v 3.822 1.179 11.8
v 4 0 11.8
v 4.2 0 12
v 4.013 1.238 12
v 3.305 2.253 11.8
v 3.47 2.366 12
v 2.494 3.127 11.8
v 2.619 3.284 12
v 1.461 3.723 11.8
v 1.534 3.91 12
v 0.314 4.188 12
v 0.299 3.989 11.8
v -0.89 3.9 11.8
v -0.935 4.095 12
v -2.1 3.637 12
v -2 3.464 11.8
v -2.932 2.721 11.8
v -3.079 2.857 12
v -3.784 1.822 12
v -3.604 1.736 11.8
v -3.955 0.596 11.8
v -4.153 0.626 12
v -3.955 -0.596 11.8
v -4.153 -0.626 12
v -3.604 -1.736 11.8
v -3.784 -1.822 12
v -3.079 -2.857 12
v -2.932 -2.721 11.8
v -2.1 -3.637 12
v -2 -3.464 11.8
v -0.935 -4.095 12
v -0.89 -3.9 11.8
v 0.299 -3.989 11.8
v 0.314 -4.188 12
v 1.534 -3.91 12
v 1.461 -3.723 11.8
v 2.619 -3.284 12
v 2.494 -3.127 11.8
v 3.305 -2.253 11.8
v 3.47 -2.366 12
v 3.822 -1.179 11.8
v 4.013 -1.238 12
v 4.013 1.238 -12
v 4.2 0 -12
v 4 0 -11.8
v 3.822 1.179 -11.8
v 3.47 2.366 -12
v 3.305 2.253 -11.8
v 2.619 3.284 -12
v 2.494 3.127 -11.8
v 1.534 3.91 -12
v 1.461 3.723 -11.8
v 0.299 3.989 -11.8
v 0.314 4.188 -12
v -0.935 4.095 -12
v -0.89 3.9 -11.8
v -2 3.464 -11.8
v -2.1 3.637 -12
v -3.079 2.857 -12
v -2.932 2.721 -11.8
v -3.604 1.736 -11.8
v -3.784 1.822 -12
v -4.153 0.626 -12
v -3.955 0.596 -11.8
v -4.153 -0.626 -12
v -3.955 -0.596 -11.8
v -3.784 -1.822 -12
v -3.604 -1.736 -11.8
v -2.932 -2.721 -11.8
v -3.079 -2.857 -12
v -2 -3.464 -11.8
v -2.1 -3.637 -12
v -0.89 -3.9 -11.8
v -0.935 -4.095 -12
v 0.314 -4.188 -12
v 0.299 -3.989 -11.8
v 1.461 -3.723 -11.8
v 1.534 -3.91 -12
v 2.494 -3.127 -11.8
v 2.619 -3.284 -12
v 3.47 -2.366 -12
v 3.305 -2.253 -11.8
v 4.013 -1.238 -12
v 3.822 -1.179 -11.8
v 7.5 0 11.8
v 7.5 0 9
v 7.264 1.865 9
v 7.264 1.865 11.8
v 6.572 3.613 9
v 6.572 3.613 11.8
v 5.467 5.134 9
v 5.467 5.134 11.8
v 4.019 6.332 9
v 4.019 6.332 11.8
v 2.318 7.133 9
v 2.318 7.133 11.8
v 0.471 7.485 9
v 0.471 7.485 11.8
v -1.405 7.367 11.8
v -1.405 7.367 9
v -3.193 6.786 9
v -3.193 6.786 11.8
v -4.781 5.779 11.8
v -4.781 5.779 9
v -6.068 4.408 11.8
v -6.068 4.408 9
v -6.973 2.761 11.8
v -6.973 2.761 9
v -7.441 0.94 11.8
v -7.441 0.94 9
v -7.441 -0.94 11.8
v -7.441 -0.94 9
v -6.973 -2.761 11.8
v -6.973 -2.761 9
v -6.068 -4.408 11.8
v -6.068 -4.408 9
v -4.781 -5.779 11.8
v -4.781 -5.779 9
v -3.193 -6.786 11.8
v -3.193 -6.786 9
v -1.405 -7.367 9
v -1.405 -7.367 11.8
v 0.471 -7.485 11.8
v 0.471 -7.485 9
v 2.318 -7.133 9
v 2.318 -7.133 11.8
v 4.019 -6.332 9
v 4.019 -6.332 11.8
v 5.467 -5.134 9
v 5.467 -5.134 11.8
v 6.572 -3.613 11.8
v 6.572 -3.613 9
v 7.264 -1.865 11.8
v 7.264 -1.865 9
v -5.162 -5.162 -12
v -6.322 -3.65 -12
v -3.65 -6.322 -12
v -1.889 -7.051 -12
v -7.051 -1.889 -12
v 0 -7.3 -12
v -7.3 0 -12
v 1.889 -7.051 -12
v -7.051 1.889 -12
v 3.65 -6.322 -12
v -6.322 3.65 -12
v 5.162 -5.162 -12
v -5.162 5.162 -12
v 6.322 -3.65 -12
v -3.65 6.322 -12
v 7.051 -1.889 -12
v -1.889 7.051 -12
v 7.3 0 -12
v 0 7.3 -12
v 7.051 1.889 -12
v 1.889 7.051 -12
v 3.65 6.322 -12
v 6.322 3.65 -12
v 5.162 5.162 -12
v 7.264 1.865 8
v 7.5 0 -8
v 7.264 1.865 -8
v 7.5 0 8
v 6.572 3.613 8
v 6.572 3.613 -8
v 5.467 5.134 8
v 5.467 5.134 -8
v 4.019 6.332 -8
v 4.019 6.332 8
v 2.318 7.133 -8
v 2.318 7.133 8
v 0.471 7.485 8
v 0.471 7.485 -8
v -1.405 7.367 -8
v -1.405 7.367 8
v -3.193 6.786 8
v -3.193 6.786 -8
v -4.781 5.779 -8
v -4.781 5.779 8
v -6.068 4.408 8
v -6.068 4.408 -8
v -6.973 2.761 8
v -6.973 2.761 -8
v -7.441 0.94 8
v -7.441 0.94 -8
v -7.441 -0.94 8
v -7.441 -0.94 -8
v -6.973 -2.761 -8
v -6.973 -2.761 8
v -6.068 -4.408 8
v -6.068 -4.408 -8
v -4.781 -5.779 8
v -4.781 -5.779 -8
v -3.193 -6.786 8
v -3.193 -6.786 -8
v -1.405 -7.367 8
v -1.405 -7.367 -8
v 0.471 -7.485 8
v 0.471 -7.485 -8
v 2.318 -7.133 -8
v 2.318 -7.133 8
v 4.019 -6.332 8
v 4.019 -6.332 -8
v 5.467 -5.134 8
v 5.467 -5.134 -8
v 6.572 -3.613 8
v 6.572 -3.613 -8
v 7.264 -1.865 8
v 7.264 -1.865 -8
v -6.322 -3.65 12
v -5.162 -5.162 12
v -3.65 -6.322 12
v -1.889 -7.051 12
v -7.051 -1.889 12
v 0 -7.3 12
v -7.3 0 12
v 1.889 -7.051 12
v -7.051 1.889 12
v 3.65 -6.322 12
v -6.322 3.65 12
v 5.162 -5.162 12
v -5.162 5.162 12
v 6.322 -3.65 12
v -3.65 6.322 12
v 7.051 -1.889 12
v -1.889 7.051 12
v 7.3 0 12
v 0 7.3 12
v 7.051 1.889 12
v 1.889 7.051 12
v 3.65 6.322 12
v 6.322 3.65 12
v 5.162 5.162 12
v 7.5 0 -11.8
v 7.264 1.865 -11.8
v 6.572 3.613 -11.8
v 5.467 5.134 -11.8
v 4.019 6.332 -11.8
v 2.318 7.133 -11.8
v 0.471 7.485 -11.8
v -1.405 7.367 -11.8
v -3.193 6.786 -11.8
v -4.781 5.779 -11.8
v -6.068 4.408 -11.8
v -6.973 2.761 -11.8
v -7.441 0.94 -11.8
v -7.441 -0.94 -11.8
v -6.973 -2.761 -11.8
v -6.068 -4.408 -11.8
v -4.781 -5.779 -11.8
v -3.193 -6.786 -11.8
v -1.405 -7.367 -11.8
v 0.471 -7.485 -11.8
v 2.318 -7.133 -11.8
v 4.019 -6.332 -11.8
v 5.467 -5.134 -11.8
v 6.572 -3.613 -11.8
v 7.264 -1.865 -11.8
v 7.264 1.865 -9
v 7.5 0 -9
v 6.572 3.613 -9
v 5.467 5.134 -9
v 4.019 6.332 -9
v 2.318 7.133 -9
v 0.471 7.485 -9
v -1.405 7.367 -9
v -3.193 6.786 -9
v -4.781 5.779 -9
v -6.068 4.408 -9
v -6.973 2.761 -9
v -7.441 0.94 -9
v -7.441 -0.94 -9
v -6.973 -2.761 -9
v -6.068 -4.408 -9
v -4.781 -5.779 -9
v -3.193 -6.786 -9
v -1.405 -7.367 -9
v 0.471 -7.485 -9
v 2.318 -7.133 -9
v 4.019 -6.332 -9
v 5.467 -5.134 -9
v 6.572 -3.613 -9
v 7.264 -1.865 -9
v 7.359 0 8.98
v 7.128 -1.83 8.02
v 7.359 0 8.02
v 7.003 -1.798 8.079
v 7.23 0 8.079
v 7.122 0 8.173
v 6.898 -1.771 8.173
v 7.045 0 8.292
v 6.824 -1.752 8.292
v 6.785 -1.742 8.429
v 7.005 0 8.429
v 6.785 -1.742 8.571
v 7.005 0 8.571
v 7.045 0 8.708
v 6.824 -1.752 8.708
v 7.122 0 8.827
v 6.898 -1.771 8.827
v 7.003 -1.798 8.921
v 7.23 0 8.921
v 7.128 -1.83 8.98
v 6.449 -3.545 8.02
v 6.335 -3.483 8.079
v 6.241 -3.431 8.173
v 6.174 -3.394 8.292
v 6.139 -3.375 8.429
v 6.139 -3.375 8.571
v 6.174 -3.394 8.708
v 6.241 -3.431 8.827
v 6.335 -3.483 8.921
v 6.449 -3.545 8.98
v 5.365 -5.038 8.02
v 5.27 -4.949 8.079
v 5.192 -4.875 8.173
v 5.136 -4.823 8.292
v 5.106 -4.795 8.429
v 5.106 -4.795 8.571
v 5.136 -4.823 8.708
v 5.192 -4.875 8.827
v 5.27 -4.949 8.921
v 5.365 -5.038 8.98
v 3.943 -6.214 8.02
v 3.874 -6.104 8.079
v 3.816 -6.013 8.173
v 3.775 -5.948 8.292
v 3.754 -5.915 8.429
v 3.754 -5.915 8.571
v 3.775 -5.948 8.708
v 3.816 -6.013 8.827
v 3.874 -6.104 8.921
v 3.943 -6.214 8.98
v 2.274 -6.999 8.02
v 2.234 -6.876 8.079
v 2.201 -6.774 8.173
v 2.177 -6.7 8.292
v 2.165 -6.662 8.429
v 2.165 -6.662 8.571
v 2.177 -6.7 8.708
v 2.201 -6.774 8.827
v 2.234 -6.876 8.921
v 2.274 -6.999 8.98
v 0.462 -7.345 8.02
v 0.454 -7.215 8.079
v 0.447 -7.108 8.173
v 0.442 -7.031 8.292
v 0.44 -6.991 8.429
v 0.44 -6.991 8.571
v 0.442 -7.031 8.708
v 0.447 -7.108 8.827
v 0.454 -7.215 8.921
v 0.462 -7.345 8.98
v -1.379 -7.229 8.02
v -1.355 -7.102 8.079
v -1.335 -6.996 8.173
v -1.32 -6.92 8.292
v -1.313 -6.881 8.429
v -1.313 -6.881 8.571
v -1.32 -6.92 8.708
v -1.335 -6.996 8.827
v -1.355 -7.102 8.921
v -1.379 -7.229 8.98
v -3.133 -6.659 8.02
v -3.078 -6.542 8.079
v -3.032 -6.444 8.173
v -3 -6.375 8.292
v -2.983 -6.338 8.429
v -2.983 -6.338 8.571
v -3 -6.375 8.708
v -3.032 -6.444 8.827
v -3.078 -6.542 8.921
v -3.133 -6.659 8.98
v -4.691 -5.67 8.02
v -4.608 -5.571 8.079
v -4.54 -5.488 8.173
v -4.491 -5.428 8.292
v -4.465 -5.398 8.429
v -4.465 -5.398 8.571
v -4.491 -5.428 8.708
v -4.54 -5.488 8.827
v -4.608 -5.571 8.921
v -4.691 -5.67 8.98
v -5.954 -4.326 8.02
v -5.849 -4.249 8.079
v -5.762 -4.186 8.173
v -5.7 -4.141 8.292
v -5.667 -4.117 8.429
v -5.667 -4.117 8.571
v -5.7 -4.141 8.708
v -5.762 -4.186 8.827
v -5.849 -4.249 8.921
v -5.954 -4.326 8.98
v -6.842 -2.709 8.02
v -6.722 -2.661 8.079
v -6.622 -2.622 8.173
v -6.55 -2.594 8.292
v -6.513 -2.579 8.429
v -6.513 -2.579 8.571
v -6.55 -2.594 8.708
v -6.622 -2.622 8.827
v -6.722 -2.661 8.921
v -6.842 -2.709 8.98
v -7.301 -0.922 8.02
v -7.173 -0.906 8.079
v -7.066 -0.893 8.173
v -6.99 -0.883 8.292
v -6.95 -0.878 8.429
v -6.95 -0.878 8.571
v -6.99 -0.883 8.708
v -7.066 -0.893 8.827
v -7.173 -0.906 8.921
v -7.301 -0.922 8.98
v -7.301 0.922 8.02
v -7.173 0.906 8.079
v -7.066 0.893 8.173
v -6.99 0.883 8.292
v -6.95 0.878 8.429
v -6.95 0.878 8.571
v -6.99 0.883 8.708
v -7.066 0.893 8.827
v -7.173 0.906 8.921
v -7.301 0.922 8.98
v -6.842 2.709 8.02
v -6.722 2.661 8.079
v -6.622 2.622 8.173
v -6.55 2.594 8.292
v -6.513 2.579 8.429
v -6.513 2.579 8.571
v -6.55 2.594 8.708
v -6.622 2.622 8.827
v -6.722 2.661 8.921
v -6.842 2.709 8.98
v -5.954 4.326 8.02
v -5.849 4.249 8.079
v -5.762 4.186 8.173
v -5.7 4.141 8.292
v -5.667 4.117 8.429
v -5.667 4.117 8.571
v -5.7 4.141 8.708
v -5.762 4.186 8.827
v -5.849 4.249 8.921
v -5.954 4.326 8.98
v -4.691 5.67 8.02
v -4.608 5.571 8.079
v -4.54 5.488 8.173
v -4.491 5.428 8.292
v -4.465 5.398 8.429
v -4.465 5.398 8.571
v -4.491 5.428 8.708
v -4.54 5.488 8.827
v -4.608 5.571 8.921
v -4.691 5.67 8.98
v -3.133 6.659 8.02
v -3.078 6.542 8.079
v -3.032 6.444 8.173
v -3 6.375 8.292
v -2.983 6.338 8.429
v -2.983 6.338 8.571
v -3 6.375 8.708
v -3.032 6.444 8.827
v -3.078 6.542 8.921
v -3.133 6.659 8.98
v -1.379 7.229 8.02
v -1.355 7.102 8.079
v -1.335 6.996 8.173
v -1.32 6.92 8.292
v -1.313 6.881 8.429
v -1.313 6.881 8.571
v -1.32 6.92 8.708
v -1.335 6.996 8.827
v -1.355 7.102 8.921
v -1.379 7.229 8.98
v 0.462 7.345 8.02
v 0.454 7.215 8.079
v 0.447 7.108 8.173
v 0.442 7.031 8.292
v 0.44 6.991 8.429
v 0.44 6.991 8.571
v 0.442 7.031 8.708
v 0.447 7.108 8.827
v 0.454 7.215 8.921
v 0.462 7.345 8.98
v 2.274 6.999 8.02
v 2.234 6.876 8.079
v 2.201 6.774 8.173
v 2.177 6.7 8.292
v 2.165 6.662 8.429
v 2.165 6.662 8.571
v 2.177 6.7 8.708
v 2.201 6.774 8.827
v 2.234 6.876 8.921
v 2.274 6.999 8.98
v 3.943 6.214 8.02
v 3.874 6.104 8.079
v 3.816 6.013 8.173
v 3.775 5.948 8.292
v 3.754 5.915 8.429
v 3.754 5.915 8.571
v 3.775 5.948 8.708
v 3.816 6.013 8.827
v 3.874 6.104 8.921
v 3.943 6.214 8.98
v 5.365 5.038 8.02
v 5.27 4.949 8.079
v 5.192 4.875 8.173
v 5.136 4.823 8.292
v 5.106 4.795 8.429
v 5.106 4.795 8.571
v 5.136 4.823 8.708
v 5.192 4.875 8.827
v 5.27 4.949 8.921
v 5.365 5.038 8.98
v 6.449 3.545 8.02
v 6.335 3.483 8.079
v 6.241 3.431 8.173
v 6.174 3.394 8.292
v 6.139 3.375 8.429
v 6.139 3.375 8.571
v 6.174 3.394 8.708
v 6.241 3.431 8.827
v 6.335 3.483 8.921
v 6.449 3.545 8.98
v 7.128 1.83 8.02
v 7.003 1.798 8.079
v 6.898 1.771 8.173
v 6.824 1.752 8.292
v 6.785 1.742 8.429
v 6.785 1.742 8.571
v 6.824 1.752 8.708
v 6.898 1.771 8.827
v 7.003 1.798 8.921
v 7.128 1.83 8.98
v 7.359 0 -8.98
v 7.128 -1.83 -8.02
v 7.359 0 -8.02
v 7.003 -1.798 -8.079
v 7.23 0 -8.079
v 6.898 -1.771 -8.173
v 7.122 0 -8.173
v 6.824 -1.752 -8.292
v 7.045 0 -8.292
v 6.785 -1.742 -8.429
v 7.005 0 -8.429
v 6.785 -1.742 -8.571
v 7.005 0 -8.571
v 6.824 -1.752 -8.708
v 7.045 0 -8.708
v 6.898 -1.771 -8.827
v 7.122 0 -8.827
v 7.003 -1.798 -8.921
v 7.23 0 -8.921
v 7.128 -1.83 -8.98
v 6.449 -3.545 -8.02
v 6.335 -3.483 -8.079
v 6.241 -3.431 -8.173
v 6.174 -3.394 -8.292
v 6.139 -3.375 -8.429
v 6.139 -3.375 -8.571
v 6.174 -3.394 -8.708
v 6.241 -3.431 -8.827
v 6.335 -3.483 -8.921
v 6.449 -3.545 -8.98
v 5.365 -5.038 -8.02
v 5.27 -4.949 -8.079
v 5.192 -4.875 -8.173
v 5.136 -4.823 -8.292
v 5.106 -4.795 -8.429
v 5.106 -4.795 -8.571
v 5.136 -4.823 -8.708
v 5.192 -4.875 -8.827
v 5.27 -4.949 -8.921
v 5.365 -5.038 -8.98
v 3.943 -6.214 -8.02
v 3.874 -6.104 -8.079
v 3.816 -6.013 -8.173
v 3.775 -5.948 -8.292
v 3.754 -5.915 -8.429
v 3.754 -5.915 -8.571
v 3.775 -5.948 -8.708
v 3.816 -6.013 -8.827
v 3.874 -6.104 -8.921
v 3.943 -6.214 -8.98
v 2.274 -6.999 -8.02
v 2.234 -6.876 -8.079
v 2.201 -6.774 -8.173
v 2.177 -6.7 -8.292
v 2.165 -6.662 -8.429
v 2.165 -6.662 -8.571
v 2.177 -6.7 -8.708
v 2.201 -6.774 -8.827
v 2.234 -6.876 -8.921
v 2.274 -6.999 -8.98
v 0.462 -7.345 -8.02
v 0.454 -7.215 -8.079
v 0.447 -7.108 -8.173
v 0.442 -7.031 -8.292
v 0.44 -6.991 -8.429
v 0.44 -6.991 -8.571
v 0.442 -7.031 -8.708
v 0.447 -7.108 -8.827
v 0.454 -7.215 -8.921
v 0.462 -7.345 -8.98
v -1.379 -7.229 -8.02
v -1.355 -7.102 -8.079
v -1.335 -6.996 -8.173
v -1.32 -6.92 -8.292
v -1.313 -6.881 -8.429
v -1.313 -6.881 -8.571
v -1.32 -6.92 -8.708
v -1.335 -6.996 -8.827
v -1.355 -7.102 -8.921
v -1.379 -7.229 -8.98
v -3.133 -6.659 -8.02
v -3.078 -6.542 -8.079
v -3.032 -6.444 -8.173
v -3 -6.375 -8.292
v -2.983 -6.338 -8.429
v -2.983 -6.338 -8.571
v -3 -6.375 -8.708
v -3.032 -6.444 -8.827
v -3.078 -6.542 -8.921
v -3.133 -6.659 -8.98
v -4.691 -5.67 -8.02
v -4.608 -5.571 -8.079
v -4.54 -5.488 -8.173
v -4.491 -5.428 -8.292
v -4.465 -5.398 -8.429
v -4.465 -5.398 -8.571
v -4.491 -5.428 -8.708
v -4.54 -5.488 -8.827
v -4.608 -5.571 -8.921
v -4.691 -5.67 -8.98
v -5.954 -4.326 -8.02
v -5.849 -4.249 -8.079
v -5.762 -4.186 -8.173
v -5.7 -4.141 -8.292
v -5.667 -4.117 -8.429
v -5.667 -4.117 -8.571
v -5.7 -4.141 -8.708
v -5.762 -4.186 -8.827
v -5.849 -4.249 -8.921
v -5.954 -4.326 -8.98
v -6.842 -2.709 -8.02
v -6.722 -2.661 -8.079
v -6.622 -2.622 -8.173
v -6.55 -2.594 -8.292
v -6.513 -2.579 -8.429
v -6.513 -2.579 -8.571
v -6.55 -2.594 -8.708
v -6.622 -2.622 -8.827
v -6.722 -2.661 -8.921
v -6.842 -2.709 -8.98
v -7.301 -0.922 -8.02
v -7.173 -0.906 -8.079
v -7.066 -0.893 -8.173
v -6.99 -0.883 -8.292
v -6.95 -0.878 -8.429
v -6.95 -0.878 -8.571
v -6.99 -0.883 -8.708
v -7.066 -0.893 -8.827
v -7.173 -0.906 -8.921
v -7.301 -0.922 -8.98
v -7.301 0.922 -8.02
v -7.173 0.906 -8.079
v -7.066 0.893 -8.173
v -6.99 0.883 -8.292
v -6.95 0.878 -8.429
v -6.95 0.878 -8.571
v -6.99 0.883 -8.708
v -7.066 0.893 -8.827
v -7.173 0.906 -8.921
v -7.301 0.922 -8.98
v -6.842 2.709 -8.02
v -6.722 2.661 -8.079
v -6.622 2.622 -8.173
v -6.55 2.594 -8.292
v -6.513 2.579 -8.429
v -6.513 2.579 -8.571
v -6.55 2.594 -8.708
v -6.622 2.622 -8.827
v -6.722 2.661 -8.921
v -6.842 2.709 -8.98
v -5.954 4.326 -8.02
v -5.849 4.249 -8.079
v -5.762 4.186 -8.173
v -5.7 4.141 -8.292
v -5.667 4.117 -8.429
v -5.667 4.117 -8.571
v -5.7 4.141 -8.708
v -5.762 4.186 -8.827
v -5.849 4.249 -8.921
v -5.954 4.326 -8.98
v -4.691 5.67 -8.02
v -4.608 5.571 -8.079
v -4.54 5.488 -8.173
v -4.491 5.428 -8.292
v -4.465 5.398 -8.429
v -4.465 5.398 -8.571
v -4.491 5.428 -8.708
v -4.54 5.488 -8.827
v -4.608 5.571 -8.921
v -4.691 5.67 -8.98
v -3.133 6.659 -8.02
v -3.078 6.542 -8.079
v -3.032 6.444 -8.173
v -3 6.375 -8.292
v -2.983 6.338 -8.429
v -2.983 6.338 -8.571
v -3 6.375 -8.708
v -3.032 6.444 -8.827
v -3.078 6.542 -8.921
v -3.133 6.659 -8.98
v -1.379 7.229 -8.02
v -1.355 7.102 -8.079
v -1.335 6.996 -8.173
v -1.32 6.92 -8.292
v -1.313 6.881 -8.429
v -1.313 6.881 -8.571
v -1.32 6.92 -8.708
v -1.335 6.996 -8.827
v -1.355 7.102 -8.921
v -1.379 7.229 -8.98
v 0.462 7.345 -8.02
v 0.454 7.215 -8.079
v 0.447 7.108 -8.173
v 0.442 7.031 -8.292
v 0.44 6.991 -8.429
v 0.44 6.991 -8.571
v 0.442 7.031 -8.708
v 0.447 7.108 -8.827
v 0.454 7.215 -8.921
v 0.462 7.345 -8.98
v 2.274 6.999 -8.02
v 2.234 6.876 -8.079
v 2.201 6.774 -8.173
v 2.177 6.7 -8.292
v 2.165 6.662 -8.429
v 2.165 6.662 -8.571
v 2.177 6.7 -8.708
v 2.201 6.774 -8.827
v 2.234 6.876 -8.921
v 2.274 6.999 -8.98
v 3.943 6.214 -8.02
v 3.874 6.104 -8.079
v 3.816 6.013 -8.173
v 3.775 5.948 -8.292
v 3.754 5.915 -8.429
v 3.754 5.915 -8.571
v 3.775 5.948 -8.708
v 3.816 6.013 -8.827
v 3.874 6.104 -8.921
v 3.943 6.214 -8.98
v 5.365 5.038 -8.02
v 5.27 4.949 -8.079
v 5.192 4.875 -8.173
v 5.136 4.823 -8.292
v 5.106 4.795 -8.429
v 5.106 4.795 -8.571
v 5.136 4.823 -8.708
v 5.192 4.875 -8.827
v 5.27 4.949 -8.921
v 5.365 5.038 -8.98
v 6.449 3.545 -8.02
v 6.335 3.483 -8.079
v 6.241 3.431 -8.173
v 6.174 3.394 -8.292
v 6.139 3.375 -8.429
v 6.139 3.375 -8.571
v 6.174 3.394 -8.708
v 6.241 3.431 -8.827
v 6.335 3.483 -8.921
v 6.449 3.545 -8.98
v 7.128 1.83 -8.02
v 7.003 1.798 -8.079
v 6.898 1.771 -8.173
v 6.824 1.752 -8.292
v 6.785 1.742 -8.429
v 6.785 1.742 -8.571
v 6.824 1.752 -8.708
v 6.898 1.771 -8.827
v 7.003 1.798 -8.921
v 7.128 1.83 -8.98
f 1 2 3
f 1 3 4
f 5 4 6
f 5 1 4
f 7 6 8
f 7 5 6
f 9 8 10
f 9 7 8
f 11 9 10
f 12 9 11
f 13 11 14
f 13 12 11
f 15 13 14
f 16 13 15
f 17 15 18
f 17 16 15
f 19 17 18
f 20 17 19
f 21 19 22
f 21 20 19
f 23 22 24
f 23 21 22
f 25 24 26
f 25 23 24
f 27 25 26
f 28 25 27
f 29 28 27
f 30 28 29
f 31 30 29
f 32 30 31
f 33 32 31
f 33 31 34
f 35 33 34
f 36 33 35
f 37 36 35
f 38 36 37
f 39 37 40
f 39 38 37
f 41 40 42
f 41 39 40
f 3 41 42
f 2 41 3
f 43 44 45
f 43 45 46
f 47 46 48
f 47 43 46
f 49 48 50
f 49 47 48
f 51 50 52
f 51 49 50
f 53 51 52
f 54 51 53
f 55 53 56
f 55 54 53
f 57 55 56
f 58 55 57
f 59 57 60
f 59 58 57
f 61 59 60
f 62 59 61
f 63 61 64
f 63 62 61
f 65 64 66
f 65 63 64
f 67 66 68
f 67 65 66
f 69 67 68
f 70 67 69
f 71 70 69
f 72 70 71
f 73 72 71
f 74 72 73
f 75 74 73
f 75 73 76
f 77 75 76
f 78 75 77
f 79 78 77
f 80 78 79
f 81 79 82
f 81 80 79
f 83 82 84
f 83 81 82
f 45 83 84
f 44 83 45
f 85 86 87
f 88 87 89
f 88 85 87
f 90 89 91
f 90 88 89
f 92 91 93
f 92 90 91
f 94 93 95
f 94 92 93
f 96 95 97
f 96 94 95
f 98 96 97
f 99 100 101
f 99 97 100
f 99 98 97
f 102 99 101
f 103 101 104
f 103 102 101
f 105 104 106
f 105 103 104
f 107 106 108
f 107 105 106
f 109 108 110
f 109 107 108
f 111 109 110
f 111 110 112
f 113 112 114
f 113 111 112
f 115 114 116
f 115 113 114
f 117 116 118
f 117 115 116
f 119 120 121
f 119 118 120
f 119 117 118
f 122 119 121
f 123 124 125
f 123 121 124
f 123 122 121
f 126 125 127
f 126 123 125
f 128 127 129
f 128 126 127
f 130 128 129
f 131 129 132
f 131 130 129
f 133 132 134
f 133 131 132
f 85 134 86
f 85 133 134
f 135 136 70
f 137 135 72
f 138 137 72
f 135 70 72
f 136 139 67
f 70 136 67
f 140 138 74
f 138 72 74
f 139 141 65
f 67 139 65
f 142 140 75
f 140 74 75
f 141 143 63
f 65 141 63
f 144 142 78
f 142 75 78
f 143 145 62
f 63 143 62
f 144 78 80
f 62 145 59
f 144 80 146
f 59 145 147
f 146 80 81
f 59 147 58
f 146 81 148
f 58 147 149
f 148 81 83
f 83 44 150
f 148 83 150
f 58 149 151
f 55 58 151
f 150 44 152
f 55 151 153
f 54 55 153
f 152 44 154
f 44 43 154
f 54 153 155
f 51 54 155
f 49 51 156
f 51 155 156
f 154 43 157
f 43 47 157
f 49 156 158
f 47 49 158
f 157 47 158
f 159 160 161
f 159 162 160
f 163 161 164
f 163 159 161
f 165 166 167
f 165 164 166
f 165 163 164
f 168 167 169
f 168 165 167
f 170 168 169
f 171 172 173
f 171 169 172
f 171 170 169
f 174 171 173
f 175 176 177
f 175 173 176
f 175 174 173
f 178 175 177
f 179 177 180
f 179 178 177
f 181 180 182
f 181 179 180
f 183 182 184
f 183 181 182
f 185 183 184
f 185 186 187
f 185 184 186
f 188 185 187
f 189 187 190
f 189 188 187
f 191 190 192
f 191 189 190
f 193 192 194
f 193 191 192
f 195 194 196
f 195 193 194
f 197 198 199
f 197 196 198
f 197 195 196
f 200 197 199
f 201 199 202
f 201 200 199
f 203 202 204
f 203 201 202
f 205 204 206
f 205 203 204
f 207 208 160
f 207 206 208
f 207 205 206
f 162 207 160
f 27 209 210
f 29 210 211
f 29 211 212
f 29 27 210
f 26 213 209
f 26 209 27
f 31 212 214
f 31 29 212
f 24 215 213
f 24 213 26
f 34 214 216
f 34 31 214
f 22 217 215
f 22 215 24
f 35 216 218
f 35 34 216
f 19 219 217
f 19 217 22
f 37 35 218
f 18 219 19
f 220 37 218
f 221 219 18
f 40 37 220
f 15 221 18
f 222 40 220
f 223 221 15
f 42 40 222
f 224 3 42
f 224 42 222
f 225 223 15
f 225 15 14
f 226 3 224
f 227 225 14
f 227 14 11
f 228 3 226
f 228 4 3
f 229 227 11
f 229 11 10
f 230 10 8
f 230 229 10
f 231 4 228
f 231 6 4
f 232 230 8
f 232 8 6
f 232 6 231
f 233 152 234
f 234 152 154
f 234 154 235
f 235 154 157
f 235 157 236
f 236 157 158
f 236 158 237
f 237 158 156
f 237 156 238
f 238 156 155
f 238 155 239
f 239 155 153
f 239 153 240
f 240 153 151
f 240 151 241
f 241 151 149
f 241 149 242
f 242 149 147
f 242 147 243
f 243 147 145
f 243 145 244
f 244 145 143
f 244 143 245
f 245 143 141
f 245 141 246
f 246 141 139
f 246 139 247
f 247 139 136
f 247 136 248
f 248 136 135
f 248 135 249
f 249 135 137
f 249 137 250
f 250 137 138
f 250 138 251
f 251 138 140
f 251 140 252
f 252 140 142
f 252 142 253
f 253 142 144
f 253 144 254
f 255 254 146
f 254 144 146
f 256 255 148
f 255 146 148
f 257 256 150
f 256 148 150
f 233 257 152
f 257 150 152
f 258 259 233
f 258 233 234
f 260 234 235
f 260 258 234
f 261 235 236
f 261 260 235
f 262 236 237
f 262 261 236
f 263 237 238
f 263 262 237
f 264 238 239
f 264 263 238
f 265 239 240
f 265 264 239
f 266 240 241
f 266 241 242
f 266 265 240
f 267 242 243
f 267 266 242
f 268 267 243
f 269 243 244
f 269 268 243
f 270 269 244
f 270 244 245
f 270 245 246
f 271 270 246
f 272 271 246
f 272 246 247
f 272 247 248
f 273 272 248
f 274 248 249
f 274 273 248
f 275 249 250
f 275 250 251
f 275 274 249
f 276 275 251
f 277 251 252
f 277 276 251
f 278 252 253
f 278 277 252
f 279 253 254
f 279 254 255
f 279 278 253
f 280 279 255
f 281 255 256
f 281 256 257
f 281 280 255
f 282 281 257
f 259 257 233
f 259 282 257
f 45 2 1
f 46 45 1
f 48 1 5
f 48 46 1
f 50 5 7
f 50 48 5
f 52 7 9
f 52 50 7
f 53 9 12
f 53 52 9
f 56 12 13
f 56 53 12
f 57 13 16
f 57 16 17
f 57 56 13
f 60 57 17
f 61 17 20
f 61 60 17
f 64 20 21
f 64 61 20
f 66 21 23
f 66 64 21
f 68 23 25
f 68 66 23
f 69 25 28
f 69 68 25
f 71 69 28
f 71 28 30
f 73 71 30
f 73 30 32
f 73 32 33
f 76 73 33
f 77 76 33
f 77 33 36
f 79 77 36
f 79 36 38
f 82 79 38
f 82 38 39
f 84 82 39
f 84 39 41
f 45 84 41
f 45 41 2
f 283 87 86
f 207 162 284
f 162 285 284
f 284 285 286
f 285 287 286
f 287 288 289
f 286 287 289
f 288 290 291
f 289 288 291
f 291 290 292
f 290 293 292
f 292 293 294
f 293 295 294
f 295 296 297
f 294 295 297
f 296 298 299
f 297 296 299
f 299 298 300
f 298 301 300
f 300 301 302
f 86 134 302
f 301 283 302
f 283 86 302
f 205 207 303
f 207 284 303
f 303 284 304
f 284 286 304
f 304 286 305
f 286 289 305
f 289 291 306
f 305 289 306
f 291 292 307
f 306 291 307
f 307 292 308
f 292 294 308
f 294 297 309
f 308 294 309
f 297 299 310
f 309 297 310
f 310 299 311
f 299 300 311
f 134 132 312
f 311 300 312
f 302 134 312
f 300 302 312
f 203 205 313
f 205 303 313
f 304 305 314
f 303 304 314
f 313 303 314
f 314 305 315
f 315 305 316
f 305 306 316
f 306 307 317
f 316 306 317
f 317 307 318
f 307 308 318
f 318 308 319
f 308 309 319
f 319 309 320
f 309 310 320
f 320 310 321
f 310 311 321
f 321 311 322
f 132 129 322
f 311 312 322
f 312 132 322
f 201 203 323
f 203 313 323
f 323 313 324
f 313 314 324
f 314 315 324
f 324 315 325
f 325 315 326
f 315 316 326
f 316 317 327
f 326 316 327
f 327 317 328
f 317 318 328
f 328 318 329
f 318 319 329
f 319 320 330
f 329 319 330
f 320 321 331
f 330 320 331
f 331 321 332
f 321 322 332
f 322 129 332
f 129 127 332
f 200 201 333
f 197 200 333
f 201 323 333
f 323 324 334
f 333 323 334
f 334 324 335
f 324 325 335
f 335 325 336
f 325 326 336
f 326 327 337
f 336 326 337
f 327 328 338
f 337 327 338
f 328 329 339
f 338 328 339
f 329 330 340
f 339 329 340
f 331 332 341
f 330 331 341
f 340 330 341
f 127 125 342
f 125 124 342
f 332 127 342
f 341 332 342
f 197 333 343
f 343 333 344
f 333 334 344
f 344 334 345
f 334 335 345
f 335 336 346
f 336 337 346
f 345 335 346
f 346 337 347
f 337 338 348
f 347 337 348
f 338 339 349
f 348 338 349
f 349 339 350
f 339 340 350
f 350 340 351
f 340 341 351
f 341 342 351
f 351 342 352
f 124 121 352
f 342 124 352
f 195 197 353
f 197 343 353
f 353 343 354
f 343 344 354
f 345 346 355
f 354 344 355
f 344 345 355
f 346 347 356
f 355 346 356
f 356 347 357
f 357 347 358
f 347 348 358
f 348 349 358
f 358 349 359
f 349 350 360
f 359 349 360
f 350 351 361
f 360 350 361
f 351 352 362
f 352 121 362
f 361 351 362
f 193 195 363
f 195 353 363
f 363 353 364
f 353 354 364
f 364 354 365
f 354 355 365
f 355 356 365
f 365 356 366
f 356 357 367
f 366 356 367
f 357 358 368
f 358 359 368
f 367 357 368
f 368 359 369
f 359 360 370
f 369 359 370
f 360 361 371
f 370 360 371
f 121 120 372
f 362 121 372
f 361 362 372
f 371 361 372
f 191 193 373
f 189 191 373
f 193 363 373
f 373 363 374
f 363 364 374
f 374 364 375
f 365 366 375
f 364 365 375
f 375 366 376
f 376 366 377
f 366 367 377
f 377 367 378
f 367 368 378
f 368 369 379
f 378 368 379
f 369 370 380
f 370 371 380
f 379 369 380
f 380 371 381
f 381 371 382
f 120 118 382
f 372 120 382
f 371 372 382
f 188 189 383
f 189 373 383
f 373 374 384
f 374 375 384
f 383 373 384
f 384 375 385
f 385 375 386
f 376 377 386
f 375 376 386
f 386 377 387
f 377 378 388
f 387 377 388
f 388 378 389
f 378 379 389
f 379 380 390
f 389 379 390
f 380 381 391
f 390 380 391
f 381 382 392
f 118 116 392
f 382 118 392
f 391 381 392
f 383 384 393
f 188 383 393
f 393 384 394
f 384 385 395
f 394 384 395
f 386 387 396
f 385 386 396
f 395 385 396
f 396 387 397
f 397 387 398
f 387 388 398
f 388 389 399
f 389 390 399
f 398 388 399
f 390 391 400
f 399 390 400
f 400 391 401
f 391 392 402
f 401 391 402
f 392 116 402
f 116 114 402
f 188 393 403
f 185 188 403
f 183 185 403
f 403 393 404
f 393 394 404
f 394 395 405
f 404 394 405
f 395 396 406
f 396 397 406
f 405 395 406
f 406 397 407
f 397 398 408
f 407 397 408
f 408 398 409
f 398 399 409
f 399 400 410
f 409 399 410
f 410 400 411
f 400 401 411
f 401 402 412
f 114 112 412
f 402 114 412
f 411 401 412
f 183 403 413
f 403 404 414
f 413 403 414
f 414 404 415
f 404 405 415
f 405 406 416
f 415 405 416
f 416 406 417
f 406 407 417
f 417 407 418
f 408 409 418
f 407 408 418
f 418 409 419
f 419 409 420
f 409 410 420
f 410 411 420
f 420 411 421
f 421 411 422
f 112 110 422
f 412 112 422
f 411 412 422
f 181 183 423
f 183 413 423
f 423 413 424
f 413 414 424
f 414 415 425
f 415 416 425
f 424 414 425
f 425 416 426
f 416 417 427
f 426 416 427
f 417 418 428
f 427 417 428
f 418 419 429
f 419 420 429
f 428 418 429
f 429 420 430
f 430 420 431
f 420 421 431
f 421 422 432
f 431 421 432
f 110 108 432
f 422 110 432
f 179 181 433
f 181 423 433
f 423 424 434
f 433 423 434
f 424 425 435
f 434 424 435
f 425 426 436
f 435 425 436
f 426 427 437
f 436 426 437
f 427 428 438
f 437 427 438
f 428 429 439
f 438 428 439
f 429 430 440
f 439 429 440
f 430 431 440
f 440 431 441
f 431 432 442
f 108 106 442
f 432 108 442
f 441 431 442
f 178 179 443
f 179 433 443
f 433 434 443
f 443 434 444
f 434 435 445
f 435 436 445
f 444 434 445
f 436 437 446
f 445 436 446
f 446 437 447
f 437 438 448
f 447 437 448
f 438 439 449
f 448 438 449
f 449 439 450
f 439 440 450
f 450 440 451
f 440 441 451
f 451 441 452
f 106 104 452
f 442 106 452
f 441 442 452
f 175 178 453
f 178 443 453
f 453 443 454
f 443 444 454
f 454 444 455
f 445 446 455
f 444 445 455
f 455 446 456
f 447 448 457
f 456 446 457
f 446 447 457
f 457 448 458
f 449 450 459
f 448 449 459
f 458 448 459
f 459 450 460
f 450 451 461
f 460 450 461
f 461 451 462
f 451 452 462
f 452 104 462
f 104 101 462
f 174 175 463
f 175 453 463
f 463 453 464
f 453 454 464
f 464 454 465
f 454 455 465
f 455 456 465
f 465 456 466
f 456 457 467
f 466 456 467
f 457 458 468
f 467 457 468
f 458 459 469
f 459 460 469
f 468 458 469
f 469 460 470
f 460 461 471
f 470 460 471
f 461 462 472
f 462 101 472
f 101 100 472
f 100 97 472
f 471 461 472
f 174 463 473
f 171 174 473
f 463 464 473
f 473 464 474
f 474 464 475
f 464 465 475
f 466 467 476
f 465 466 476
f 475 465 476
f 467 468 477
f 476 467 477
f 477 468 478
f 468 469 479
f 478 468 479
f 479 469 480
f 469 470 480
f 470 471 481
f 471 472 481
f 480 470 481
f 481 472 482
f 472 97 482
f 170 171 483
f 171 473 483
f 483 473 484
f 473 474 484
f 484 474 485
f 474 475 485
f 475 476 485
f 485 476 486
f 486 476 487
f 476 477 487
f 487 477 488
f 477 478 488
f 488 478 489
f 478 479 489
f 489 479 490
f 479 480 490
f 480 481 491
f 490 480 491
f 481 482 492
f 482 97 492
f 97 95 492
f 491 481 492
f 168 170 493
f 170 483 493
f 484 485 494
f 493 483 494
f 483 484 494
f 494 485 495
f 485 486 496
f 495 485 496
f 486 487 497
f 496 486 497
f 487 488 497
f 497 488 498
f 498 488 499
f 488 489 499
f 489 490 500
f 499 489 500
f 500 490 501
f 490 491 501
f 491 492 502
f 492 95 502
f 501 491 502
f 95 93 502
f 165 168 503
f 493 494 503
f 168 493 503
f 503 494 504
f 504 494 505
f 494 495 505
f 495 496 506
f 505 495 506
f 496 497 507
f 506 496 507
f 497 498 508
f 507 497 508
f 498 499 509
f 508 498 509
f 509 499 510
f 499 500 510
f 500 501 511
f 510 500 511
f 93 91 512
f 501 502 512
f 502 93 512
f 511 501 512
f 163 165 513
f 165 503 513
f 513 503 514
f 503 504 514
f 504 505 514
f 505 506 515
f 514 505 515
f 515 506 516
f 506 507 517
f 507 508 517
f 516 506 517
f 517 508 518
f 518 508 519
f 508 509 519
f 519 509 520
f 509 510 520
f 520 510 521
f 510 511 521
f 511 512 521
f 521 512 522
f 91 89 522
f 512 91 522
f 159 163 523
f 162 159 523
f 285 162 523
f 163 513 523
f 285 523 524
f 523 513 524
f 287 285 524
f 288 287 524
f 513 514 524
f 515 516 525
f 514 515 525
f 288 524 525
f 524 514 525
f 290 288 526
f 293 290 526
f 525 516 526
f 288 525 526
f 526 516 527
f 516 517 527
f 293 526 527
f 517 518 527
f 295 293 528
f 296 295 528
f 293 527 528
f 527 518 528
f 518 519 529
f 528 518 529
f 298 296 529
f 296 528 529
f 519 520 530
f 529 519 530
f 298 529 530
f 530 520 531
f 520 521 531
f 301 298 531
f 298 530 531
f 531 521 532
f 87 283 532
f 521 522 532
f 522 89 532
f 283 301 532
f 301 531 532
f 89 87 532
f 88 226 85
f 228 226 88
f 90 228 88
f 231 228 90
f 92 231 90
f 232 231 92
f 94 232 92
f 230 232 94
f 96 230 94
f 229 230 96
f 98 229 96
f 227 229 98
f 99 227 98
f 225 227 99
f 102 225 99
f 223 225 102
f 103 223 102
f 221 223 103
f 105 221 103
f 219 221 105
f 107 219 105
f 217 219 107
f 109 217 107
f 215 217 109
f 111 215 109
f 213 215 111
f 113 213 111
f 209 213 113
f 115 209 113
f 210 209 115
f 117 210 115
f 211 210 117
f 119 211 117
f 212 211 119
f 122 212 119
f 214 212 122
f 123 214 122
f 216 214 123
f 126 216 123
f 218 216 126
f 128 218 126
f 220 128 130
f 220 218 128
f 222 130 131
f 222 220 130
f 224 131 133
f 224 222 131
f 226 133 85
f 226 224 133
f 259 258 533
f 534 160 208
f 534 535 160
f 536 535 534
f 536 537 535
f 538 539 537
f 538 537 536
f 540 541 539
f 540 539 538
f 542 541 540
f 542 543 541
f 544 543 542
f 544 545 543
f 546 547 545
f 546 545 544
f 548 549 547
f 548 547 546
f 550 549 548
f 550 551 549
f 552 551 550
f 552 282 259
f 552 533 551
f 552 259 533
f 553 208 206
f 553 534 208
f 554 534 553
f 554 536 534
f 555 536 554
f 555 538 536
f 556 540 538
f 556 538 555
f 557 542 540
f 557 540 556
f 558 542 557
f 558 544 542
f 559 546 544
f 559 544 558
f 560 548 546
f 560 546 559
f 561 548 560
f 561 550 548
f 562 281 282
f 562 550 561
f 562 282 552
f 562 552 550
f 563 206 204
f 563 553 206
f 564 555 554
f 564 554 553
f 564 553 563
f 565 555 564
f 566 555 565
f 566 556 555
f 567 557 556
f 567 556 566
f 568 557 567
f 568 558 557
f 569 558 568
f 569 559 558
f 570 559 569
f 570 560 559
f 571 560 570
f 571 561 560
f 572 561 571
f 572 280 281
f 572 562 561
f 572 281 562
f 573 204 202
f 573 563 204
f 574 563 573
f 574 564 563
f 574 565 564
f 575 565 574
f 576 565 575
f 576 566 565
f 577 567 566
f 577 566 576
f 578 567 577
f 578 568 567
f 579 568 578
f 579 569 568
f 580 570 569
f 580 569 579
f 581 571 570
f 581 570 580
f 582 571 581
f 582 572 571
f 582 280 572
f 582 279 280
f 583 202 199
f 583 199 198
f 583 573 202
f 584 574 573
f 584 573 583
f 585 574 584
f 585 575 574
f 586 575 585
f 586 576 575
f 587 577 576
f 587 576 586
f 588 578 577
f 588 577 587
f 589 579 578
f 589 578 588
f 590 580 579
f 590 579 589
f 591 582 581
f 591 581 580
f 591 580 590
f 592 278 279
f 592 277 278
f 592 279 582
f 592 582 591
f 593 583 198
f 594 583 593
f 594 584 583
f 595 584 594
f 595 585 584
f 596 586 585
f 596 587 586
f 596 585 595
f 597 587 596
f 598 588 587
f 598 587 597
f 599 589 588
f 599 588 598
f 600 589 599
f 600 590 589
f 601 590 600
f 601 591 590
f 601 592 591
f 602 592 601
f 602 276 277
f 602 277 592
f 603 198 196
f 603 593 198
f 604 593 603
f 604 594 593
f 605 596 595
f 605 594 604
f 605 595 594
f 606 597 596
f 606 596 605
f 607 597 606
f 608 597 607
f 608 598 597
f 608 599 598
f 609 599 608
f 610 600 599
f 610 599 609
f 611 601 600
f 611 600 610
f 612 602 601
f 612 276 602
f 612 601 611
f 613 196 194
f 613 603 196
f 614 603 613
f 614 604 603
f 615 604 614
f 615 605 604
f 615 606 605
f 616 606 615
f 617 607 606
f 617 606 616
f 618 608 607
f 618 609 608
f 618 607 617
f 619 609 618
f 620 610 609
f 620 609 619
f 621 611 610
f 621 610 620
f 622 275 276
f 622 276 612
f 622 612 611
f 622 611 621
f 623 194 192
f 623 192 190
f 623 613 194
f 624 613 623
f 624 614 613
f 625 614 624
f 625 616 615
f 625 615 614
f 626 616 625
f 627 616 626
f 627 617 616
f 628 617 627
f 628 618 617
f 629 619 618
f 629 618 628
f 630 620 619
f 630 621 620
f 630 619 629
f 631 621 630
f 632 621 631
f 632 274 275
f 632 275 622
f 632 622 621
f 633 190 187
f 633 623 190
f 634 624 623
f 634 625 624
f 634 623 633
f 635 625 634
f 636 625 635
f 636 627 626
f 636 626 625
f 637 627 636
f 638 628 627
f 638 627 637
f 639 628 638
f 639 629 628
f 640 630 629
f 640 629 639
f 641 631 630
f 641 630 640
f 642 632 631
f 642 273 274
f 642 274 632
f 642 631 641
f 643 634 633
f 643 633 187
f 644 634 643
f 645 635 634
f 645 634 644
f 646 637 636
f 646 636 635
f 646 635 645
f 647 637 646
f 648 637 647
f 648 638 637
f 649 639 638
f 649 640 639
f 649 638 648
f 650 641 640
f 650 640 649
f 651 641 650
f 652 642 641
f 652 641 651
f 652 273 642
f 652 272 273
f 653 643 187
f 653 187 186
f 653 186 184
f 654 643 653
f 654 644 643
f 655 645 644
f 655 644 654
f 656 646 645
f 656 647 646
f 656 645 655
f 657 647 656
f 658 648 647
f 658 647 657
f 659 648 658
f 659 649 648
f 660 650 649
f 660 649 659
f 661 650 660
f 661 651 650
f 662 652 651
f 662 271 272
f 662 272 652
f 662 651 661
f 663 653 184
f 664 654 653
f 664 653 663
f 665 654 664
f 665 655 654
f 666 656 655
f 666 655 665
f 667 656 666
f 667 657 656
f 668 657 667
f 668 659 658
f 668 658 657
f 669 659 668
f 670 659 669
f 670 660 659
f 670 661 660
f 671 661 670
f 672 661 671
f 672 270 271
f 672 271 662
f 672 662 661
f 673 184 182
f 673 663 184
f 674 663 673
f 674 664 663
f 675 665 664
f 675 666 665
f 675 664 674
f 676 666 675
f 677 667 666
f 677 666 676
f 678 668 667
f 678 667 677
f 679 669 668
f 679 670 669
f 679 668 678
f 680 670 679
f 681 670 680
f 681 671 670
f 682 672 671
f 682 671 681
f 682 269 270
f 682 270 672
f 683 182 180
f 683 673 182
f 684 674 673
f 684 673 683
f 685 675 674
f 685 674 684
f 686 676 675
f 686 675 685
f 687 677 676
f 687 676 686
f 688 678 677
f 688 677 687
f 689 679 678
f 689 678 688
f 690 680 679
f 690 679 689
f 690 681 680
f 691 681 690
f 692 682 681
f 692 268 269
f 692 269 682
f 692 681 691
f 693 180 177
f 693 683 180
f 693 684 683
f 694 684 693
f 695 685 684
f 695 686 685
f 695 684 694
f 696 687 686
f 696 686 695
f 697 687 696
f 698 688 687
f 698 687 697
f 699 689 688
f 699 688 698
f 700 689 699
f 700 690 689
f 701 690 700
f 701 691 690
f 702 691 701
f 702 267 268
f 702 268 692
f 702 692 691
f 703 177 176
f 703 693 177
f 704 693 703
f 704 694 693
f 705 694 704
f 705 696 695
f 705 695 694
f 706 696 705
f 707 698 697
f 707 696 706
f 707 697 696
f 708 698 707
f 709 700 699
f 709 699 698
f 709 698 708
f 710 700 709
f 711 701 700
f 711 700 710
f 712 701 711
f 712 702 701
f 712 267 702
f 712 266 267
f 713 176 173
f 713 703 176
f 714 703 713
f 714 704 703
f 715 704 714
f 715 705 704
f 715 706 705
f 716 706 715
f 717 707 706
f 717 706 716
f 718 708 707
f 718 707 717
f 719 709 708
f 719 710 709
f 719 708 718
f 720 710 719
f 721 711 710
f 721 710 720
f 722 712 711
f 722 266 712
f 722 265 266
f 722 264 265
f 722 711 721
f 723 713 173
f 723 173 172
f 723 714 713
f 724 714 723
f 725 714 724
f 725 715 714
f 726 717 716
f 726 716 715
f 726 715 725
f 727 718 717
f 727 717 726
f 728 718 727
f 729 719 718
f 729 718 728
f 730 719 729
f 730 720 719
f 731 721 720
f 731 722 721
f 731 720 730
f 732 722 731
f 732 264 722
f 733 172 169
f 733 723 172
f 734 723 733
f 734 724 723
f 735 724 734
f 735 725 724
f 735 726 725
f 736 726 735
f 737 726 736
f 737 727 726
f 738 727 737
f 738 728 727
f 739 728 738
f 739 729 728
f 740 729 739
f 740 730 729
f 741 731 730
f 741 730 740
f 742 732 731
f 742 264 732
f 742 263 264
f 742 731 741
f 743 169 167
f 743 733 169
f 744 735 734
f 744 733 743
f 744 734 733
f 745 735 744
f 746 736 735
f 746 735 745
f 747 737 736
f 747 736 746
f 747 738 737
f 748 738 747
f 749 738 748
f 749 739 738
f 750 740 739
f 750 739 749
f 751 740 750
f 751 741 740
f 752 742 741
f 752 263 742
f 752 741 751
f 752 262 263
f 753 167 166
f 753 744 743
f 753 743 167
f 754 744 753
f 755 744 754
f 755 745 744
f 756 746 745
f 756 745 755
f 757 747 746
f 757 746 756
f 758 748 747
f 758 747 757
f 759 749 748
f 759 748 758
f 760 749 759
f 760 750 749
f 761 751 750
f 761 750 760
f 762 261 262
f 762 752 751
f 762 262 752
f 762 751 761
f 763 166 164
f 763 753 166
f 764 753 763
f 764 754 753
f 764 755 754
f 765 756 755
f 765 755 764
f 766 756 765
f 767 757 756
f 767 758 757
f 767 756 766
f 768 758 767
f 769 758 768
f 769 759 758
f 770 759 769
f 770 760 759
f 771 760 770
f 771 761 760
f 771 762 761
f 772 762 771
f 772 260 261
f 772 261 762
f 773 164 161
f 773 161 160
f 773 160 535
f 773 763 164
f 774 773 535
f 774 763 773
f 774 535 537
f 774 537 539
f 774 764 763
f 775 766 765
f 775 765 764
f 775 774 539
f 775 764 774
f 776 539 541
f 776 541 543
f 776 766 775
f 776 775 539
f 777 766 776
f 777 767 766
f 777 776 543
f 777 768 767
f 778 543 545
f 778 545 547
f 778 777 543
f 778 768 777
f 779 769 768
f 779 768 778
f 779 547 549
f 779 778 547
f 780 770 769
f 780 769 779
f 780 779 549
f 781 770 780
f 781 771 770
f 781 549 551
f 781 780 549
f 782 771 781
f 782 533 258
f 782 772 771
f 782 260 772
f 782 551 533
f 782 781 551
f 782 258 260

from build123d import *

# Parameters (mm, degrees)
ESQUISSE1_R        = 7.5
ESQUISSE1_R_2      = 4
BOSS_EXTRU_1_DEPTH = 12
CHANFREIN1_SIZE    = 0.2


with BuildPart() as part:
    # Esquisse1 → Boss.-Extru.1 (new, symmetric)
    with BuildSketch(Plane.XY):
        Circle(ESQUISSE1_R)
        Circle(ESQUISSE1_R_2, mode=Mode.SUBTRACT)
    extrude(amount=BOSS_EXTRU_1_DEPTH, both=True)

    # Chanfrein1
    chanfrein1_edges = [part.edges().sort_by_distance(p)[0] for p in [
        (-7.5, 0, -12),
        (-7.5, 0, 12),
        (-4, 0, -12),
        (-4, 0, 12),
    ]]
    chamfer(chanfrein1_edges, length=CHANFREIN1_SIZE)

    # Esquisse2 → Enlèvement de matière-Révolution1 (revolve, cut)
    with BuildSketch(Plane(origin=(0, 0, 0), x_dir=(0, 0, -1), z_dir=(1, 0, 0)), mode=Mode.PRIVATE) as enl_vement_de_mati_re_r_volution1_sk:
        with BuildLine():
            Line((-9, 7.5), (-8, 7.5))
            ThreePointArc((-8, 7.5), (-8.5, 7), (-9, 7.5))
        make_face()
    enl_vement_de_mati_re_r_volution1 = revolve(enl_vement_de_mati_re_r_volution1_sk.sketch.rotate(Axis((0, 0, 55), (0, 0, -1)), 90), axis=Axis((0, 0, 55), (0, 0, -1)), mode=Mode.SUBTRACT)

    # Symétrie1: Enlèvement de matière-Révolution1 across plane
    add(enl_vement_de_mati_re_r_volution1.mirror(Plane.XY), mode=Mode.SUBTRACT)


solid = part.part
